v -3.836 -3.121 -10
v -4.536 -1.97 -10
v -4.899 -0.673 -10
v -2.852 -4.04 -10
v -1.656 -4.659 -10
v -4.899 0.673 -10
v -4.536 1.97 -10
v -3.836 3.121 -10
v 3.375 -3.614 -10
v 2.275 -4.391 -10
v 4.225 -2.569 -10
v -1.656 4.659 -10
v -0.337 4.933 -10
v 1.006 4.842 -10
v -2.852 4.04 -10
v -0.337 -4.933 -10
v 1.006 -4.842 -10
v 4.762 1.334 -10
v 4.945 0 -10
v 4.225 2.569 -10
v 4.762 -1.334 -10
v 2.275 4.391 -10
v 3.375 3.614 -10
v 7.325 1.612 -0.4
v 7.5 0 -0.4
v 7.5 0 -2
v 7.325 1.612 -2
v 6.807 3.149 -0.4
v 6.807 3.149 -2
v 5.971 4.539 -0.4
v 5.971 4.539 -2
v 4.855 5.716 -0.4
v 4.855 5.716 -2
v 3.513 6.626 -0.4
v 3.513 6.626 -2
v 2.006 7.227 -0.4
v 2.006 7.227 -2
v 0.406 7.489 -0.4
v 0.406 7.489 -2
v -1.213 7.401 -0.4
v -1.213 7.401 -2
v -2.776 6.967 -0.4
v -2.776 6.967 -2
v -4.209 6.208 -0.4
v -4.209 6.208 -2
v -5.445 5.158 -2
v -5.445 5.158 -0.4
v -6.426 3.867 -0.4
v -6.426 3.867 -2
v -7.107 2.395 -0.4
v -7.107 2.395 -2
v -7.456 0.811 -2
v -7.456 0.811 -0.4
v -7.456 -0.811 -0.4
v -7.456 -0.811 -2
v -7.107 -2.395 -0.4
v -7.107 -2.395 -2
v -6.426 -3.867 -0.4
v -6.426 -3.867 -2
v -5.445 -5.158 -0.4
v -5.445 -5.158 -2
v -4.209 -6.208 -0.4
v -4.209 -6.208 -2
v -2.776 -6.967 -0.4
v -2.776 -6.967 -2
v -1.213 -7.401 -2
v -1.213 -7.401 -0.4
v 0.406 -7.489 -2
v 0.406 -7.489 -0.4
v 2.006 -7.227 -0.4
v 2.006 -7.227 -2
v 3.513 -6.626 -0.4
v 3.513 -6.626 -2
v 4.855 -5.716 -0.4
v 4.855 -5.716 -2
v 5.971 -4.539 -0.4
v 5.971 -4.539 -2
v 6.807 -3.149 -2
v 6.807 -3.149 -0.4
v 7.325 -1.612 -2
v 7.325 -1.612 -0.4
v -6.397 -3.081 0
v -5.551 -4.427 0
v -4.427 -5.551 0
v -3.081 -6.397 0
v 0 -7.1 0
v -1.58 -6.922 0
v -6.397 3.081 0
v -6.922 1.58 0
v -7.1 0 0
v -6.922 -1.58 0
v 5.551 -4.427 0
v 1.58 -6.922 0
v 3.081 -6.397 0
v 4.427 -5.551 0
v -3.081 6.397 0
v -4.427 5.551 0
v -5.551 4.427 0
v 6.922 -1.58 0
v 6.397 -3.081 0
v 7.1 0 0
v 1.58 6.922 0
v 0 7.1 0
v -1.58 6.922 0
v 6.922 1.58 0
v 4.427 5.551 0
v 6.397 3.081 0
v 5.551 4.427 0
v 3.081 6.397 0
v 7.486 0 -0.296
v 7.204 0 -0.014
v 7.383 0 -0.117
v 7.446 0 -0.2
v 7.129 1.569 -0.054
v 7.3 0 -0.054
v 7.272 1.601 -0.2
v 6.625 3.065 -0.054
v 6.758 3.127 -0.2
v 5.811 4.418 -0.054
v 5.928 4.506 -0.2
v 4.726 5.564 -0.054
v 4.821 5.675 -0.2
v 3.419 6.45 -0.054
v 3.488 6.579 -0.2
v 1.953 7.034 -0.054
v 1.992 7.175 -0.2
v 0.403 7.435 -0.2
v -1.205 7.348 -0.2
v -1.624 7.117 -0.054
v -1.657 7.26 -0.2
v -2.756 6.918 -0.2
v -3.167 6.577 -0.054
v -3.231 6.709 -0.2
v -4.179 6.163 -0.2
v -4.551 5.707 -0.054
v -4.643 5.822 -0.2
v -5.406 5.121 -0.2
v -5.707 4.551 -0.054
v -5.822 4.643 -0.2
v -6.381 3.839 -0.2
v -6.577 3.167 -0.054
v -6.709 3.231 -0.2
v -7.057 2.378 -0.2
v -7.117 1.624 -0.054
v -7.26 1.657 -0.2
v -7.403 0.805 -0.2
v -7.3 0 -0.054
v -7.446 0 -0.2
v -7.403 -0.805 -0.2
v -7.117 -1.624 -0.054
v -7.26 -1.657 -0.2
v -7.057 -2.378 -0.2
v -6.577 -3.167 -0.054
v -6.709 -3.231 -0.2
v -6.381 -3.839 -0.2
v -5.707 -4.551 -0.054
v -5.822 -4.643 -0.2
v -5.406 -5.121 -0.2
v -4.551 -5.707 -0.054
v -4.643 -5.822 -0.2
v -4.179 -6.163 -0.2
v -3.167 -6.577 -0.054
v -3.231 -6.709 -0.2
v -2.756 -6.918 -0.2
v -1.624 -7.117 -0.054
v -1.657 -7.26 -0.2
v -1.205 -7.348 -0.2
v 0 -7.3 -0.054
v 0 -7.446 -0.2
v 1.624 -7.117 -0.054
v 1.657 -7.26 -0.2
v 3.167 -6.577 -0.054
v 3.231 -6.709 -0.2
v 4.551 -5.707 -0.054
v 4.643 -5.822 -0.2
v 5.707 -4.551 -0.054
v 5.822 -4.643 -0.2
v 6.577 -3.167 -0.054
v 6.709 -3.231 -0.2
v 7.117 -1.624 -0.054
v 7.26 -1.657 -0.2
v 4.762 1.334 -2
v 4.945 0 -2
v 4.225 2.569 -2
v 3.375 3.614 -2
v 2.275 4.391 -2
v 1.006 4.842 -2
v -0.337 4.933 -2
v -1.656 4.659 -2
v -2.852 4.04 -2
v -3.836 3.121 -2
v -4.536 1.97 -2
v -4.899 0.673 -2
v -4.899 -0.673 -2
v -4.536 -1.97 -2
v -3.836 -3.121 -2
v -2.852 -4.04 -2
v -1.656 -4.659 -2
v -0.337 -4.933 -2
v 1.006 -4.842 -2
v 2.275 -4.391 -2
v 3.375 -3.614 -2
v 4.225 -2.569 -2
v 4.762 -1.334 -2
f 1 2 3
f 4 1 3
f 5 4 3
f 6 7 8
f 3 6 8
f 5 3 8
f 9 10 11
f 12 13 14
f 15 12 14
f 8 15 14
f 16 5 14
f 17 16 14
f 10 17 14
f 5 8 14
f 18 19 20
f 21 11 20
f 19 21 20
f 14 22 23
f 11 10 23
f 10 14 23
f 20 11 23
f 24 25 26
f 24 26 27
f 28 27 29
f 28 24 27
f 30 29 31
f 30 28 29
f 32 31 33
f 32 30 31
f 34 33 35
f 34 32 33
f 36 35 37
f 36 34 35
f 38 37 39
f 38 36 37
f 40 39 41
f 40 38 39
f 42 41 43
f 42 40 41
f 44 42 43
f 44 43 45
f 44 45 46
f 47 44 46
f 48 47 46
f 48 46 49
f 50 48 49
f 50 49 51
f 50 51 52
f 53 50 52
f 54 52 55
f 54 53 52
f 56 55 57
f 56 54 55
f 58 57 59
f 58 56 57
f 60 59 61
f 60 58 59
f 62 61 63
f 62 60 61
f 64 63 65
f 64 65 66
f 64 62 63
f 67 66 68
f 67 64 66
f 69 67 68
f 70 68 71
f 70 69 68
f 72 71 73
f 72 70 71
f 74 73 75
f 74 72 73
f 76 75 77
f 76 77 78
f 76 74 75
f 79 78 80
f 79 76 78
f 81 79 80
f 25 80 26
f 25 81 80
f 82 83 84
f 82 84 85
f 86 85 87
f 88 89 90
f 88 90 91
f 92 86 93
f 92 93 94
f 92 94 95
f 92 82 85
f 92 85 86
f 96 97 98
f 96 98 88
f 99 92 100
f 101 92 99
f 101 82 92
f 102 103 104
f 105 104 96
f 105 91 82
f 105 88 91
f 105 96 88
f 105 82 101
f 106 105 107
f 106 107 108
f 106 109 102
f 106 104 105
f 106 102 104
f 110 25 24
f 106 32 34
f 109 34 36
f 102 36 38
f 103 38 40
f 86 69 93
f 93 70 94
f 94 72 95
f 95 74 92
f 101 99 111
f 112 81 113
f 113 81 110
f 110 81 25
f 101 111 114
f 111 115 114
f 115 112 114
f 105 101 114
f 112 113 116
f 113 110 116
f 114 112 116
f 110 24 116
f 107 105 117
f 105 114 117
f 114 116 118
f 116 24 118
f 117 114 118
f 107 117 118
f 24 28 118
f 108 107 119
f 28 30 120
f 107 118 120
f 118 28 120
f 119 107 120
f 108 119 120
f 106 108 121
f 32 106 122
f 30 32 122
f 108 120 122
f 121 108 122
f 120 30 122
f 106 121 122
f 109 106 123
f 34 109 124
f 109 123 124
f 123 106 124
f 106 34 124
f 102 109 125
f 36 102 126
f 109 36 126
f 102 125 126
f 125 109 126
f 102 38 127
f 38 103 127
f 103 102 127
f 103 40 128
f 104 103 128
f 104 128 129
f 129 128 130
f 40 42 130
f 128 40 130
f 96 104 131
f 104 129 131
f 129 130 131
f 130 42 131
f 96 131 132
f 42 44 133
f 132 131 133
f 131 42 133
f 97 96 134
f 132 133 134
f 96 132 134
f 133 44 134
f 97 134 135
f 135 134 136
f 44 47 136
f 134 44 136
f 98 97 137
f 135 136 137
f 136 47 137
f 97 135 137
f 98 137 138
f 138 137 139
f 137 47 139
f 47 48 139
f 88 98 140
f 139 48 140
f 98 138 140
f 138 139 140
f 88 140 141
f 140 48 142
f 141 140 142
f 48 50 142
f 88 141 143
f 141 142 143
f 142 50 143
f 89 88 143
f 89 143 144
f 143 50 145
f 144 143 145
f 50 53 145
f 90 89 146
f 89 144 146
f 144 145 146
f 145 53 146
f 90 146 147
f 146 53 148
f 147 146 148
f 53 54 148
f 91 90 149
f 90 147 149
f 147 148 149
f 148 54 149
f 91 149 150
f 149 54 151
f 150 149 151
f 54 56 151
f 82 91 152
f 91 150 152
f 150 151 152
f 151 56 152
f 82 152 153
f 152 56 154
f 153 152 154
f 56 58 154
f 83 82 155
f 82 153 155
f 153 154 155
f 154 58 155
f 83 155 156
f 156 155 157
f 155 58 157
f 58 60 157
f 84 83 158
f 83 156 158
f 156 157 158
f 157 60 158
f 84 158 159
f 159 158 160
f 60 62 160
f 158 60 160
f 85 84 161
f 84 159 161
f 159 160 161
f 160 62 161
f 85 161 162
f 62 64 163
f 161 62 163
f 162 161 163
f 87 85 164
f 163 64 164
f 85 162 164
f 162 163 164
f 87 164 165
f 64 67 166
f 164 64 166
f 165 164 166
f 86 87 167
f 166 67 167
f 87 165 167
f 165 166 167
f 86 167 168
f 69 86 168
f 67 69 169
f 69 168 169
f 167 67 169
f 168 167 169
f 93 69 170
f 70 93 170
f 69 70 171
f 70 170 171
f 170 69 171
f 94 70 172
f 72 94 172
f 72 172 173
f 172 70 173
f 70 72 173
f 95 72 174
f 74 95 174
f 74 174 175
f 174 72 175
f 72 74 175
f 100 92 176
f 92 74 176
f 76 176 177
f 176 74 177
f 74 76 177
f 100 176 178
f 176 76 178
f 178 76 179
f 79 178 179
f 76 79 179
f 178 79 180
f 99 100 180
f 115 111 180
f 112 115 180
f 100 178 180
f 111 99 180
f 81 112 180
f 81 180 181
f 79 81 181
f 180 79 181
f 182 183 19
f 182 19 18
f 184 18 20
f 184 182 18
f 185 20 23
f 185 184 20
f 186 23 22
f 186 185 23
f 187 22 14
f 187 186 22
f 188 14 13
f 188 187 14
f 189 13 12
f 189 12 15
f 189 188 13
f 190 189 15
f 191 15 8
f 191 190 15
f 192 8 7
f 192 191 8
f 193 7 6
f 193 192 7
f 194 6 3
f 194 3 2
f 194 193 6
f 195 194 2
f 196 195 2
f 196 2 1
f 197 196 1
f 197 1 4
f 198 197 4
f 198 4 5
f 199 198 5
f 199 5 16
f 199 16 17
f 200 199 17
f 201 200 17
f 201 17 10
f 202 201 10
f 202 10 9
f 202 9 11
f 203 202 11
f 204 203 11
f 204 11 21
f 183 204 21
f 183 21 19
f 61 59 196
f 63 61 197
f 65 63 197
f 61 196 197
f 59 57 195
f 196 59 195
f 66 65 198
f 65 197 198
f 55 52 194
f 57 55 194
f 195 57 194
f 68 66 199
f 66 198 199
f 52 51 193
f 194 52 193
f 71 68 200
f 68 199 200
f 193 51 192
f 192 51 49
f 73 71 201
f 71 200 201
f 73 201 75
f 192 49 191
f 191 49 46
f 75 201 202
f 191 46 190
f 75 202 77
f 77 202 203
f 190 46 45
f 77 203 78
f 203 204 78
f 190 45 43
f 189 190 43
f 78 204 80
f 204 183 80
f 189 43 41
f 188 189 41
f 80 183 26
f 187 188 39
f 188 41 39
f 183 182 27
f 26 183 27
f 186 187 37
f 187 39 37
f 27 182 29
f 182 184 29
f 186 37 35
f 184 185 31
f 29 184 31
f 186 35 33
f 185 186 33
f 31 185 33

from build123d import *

# Parameters (mm, degrees)
SKETCH1_R           = 7.5
BOSS_EXTRUDE1_DEPTH = 2
SKETCH2_R           = 4.945
BOSS_EXTRUDE2_DEPTH = 10
FILLET2_R           = 0.4


with BuildPart() as part:
    # Sketch1 → Boss-Extrude1 (new body)
    with BuildSketch(Plane.XY):
        Circle(SKETCH1_R)
    extrude(amount=-BOSS_EXTRUDE1_DEPTH)

    # Sketch2 → Boss-Extrude2 (add)
    with BuildSketch(Plane.XY):
        Circle(SKETCH2_R)
    extrude(amount=-BOSS_EXTRUDE2_DEPTH)

    # Fillet2
    fillet2_edges = [part.edges().sort_by_distance(p)[0] for p in [
        (-7.5, 0, 0),
    ]]
    fillet(fillet2_edges, radius=FILLET2_R)


solid = part.part
